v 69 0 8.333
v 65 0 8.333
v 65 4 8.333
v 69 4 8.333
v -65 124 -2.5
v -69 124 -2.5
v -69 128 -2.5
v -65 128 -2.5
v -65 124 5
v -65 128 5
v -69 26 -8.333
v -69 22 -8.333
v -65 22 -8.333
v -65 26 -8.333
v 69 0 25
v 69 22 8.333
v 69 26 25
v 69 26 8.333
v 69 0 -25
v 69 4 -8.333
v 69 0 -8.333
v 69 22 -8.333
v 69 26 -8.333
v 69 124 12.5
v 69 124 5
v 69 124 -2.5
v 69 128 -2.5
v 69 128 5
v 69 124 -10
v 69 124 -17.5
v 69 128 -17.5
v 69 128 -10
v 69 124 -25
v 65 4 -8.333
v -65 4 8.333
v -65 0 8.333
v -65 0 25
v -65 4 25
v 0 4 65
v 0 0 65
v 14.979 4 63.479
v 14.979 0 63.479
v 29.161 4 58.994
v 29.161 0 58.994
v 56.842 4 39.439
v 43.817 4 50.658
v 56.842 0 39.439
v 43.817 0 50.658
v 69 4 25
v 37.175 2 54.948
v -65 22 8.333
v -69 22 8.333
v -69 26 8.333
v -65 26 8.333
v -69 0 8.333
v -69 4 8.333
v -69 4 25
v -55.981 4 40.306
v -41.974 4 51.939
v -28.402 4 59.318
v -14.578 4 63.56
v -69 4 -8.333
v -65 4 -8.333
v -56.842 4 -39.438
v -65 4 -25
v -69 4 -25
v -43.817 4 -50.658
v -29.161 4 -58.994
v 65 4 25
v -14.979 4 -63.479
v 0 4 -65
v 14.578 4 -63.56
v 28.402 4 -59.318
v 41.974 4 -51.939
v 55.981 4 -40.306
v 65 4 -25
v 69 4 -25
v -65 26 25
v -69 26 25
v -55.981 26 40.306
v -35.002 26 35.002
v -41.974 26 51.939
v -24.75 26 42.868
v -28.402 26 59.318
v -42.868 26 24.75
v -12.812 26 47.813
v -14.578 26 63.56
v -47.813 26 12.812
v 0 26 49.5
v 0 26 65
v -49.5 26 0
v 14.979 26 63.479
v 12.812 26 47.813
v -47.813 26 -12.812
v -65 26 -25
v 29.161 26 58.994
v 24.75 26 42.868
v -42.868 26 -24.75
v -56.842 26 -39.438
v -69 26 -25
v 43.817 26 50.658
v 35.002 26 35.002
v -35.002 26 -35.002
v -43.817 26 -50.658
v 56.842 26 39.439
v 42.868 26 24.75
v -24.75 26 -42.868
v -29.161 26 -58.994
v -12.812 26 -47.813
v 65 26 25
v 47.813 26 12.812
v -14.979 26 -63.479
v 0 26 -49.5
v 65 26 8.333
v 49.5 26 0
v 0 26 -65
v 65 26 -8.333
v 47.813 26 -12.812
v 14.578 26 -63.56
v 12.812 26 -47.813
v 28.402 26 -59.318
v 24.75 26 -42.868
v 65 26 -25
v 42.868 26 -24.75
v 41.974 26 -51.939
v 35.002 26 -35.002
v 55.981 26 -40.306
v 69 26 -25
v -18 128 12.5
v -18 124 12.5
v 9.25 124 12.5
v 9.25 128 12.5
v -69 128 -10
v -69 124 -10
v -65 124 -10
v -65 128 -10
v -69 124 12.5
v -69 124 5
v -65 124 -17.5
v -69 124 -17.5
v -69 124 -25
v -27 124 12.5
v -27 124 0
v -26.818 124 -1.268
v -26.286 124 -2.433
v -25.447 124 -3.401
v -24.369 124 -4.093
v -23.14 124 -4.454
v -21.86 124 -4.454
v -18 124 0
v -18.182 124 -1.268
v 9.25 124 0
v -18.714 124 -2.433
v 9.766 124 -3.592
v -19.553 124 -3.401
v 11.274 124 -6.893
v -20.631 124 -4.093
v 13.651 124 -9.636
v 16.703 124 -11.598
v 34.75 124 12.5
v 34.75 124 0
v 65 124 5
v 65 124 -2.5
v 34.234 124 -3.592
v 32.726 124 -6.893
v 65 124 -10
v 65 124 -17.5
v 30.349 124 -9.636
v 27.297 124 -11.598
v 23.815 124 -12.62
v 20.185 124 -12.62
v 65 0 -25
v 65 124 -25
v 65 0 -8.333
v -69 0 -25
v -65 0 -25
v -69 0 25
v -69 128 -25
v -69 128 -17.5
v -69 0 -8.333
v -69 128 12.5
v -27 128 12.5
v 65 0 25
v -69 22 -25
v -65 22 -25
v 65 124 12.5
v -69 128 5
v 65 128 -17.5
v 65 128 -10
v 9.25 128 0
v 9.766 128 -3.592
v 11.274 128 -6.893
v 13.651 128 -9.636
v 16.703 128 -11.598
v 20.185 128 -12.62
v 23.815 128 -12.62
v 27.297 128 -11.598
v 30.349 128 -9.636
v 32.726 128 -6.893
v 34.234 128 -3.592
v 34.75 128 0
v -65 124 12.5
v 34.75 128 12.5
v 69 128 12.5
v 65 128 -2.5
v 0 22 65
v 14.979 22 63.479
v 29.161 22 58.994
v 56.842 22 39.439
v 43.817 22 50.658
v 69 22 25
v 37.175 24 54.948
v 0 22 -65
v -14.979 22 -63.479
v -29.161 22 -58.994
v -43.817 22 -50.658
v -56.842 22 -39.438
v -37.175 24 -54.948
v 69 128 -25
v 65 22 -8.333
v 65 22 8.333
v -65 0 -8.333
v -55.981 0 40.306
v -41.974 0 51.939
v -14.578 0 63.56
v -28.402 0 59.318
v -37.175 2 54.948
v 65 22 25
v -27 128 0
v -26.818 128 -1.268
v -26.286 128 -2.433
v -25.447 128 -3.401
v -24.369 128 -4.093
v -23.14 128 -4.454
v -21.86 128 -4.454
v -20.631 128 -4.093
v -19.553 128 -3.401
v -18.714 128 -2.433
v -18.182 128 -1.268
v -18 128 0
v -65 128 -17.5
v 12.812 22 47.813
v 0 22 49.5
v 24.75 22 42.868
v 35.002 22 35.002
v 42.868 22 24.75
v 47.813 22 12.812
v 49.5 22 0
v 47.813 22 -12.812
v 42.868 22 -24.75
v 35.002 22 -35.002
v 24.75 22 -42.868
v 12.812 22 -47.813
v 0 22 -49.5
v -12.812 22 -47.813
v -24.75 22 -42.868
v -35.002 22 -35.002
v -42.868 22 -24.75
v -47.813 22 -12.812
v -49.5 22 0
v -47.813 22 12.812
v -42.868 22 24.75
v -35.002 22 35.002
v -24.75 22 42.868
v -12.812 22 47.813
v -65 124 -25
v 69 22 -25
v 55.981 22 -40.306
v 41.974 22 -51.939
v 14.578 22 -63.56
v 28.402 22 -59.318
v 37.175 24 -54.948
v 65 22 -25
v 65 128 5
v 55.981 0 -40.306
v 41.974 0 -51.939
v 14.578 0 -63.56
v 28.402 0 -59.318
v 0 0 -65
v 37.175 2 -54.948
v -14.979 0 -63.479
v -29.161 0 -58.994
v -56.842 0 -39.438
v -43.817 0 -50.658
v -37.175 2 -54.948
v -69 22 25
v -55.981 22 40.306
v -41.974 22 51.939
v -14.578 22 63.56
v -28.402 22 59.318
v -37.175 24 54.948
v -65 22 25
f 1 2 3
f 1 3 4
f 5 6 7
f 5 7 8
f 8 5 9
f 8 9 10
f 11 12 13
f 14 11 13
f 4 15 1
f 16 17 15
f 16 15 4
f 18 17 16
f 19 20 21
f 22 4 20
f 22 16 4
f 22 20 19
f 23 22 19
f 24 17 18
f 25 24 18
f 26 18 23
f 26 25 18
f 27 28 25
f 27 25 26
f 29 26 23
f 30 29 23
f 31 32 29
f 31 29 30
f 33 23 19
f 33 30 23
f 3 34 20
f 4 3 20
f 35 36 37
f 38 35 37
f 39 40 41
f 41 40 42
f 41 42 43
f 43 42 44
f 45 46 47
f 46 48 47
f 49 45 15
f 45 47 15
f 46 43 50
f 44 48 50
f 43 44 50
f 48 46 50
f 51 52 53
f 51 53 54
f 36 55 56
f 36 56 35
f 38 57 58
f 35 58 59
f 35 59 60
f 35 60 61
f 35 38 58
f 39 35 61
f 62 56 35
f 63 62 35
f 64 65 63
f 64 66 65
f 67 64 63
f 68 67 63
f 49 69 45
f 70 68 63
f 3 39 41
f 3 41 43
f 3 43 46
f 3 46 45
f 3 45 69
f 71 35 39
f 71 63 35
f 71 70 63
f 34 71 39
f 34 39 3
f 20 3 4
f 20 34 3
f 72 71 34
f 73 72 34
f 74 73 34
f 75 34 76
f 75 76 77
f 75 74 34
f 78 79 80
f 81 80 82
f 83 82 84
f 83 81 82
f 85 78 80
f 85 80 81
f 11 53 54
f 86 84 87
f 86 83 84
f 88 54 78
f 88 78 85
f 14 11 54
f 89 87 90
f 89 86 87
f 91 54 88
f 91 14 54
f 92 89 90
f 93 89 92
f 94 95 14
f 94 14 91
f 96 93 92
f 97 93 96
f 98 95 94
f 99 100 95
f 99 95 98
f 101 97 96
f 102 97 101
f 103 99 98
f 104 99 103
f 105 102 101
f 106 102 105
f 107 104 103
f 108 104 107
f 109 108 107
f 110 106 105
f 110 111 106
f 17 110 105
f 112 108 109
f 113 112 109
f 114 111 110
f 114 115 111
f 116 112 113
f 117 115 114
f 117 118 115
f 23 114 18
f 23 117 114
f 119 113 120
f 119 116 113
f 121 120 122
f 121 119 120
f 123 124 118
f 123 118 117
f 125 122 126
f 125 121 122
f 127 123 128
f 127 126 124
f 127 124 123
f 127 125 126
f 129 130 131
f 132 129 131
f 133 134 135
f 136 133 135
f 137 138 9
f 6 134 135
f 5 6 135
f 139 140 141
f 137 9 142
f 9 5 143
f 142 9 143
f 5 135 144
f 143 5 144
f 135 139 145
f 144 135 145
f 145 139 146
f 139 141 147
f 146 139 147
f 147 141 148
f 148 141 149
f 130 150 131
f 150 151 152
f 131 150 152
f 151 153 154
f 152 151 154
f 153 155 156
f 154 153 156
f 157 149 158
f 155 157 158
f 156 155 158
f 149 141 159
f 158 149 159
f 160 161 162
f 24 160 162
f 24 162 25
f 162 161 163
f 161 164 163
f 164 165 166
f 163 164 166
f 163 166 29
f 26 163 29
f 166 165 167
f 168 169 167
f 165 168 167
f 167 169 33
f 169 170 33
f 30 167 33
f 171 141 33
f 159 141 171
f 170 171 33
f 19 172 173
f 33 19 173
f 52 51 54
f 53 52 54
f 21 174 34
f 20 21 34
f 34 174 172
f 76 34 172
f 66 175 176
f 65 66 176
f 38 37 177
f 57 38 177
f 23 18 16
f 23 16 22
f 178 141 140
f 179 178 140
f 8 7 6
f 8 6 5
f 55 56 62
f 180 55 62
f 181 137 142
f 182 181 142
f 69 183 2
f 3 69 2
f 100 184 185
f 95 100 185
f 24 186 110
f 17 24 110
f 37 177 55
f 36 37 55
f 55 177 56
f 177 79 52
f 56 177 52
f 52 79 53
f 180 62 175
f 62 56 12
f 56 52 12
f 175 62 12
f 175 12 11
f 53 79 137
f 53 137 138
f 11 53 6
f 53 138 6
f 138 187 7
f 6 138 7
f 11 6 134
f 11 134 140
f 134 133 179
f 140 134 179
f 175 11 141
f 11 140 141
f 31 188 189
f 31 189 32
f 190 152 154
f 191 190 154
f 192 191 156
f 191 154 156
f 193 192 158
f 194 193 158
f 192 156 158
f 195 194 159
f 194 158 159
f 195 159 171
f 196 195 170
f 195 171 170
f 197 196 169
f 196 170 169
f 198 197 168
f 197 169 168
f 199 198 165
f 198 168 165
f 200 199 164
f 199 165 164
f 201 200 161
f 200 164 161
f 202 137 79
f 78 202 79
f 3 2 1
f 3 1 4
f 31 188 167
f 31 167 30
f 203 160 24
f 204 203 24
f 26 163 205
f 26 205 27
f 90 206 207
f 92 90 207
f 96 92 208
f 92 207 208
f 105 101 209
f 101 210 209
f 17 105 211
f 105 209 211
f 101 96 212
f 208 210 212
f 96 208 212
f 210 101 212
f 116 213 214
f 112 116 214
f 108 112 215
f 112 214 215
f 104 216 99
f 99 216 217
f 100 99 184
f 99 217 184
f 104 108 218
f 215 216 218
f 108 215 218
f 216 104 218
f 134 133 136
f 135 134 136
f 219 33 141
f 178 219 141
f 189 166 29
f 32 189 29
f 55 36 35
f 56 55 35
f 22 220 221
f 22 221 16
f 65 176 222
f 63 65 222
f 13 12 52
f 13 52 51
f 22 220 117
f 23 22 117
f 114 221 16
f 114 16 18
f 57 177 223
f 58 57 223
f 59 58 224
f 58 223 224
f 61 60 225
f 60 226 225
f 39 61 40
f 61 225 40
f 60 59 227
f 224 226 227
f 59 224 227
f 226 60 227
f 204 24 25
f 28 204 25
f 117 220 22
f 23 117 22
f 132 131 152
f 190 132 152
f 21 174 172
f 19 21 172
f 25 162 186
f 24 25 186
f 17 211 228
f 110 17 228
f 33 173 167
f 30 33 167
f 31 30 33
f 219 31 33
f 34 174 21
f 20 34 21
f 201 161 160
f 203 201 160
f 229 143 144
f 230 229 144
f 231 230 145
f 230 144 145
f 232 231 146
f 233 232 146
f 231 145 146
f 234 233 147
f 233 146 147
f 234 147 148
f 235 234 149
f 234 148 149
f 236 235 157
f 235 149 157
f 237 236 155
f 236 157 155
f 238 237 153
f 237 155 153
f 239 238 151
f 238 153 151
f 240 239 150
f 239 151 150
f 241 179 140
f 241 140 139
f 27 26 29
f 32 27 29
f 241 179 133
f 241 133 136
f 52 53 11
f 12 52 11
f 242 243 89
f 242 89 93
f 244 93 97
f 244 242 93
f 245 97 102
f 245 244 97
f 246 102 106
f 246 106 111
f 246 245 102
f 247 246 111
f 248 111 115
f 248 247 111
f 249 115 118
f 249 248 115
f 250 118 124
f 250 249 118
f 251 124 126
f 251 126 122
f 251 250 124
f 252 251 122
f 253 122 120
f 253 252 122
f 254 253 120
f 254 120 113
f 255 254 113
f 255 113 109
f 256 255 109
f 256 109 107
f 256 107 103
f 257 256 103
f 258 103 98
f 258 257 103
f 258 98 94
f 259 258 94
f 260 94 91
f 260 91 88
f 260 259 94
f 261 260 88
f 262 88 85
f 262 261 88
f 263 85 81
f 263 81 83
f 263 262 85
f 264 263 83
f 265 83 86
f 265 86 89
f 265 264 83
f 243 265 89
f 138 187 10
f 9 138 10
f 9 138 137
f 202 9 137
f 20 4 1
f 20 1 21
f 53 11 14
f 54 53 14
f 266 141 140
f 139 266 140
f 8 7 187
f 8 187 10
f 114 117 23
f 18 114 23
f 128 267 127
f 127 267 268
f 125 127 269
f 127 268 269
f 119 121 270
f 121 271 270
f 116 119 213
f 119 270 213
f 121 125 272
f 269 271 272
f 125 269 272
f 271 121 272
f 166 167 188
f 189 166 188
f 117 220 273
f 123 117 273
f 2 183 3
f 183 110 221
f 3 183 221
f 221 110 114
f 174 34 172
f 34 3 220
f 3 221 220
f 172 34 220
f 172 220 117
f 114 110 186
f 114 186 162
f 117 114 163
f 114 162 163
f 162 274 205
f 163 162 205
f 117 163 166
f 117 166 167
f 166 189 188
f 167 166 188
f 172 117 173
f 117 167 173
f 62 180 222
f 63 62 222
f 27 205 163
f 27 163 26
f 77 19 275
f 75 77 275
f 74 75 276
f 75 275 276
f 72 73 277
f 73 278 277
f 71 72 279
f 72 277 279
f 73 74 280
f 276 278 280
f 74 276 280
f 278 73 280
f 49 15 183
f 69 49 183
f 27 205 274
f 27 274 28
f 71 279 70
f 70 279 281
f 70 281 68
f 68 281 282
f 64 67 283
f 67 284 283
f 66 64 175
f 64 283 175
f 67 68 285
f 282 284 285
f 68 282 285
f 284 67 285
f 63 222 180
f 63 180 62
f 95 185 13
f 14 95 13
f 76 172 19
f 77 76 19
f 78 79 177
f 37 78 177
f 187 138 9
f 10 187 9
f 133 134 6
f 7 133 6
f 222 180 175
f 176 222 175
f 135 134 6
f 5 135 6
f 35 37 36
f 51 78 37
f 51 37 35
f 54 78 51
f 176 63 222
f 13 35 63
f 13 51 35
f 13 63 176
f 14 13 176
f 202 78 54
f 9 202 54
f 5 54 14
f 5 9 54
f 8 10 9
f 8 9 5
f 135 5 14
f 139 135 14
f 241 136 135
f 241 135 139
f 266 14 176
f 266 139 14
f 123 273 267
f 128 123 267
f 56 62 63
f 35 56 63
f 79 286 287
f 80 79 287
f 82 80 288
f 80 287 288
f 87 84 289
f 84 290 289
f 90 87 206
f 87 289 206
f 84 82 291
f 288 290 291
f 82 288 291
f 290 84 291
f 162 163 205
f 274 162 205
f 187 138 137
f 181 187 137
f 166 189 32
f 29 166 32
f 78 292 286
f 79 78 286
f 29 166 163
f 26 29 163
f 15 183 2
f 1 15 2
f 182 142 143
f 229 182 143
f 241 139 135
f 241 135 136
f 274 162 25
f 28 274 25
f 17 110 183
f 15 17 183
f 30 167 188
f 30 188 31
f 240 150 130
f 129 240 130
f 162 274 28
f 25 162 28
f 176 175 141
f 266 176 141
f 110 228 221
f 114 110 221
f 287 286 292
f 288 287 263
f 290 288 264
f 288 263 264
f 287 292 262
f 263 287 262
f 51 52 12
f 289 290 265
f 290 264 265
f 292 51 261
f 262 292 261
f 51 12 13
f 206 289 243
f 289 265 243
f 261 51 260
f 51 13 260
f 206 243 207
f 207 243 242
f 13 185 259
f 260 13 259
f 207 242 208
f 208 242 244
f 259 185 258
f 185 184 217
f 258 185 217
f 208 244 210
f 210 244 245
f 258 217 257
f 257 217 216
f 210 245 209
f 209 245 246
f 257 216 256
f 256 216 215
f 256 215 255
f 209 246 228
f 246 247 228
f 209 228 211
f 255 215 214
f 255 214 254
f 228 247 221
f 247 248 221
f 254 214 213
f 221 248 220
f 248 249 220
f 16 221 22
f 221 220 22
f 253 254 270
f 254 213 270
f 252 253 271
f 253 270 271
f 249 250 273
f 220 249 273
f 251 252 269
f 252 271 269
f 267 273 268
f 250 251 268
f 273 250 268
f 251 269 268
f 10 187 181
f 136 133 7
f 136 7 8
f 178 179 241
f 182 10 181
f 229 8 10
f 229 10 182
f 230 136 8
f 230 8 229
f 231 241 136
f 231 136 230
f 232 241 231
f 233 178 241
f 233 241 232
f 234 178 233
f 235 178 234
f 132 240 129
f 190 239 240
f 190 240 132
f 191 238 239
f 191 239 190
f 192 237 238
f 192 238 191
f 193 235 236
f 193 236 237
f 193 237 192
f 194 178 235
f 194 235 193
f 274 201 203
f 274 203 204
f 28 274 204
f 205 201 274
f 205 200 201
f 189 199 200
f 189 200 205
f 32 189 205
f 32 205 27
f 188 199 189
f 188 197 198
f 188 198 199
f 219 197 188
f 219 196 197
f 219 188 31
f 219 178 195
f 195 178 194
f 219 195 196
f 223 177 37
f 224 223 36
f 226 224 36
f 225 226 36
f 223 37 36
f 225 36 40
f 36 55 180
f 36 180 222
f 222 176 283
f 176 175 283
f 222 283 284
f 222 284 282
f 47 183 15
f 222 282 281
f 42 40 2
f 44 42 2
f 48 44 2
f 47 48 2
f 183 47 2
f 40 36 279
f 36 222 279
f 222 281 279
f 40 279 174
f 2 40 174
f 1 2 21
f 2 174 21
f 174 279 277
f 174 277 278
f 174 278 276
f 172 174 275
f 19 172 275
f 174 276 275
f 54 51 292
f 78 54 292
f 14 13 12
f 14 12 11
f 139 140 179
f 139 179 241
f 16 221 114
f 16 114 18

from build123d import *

# Parameters (mm, degrees)
BOSS_EXTRUDE1_DEPTH = 4
SKETCH2_W           = 16.666666666
SKETCH2_H           = 4
BOSS_EXTRUDE2_DEPTH = 4
SKETCH4_R           = 49.5
BOSS_EXTRUDE3_DEPTH = 4
SKETCH5_W           = 16.666666666
SKETCH5_H           = 4
BOSS_EXTRUDE4_DEPTH = 4
BOSS_EXTRUDE5_DEPTH = 4
INDENT3_OUTLINE_W   = 4
INDENT3_OUTLINE_H   = 16.666666666
INDENT3_DEPTH       = 4
INDENT3_START       = 22
INDENT3_2_OUTLINE_W = 4
INDENT3_2_OUTLINE_H = 16.666666666
INDENT3_2_DEPTH     = 4
LPATTERN1_COUNT     = 2
LPATTERN1_PITCH     = 134
INDENT5_OUTLINE_W   = 4
INDENT5_OUTLINE_H   = 16.666666666
INDENT5_DEPTH       = 4
INDENT5_START       = 22
INDENT5_2_OUTLINE_W = 4
INDENT5_2_OUTLINE_H = 16.666666666
INDENT5_2_DEPTH     = 4
SKETCH8_W           = 4
SKETCH8_H           = 7.5
BOSS_EXTRUDE6_DEPTH = 4
LPATTERN3_COUNT     = 2
LPATTERN3_PITCH     = 134
BOSS_EXTRUDE7_DEPTH = 4
INDENT6_START       = -17.5
INDENT6_OUTLINE_W   = 4
INDENT6_OUTLINE_H   = 4
INDENT6_DEPTH       = 7.5
INDENT6_START_2     = -2.5
INDENT6_2_OUTLINE_W = 4
INDENT6_2_OUTLINE_H = 4
INDENT6_2_DEPTH     = 7.5


# Read off the part's stored shape, not the designer's step: Indent3, Indent5, Indent6
with BuildPart() as part:
    # Sketch1 → Boss-Extrude1 (new body)
    with BuildSketch(Plane(origin=(0, 0, 0), x_dir=(1, 0, 0), z_dir=(0, 1, 0))):
        with BuildLine():
            Line((-65, 25), (-65, -25))
            Line((-65, -25), (-69, -25))
            add(Edge.make_bspline(
                [(-69, -25), (-39.849959526, -64.895836828), (-2.6224e-05, -65)],
                knots=[0, 0, 0, 1, 1, 1], degree=2))
            add(Edge.make_bspline(
                [(-2.6224e-05, -65), (39.849922378, -64.895858771), (69, -25)],
                knots=[0, 0, 0, 1, 1, 1], degree=2))
            Line((69, -25), (65, -25))
            Line((65, -25), (65, 25))
            Line((65, 25), (69, 25))
            add(Edge.make_bspline(
                [(69, 25), (39.849915495, 64.895868161), (-4.5036e-05, 65)],
                knots=[0, 0, 0, 1, 1, 1], degree=2))
            add(Edge.make_bspline(
                [(-4.5036e-05, 65), (-39.849966409, 64.895827437), (-69, 25)],
                knots=[0, 0, 0, 1, 1, 1], degree=2))
            Line((-69, 25), (-65, 25))
        make_face()
    extrude(amount=BOSS_EXTRUDE1_DEPTH)

    # Sketch2 → Boss-Extrude2 (add)
    with BuildSketch(Plane(origin=(65, 0, 0), x_dir=(0, 0, -1), z_dir=(1, 0, 0))):
        with Locations((0, 2)):
            Rectangle(SKETCH2_W, SKETCH2_H)
    boss_extrude2 = extrude(amount=BOSS_EXTRUDE2_DEPTH)

    # Mirror1: Boss-Extrude2 across plane
    add(boss_extrude2.mirror(Plane(origin=(0, 0, 0), x_dir=(0, 0, 1), z_dir=(1, 0, 0))))


with BuildPart() as body_2:
    # Sketch4 → Boss-Extrude3 (new body)
    with BuildSketch(Plane(origin=(0, 22, 0), x_dir=(1, 0, 0), z_dir=(0, 1, 0))):
        with BuildLine():
            add(Edge.make_bspline(
                [(-69, -25), (-39.849959526, -64.895836827), (-2.6225e-05, -65)],
                knots=[0, 0, 0, 1, 1, 1], degree=2))
            add(Edge.make_bspline(
                [(-2.6225e-05, -65), (39.849922378, -64.895858771), (69, -25)],
                knots=[0, 0, 0, 1, 1, 1], degree=2))
            Line((69, -25), (65, -25))
            Line((65, -25), (65, 25))
            Line((65, 25), (69, 25))
            add(Edge.make_bspline(
                [(69, 25), (39.849915496, 64.895868161), (-4.5035e-05, 65)],
                knots=[0, 0, 0, 1, 1, 1], degree=2))
            add(Edge.make_bspline(
                [(-4.5035e-05, 65), (-39.849966364, 64.895827438), (-68.999999935, 25.000000088)],
                knots=[0, 0, 0, 1, 1, 1], degree=2))
            Line((-68.999999935, 25.000000088), (-65, 25))
            Line((-65, 25), (-65, -25))
            Line((-65, -25), (-69, -25))
        make_face()
        with Locations(Location((0, 0, 0), (0, 0, 270))):
            Circle(SKETCH4_R, mode=Mode.SUBTRACT)
    extrude(amount=BOSS_EXTRUDE3_DEPTH)

    # Sketch5 → Boss-Extrude4 (add)
    with BuildSketch(Plane(origin=(65, 0, 0), x_dir=(0, 0, -1), z_dir=(1, 0, 0))):
        with Locations((0, 24)):
            Rectangle(SKETCH5_W, SKETCH5_H)
    boss_extrude4 = extrude(amount=BOSS_EXTRUDE4_DEPTH)

    # Mirror2: Boss-Extrude4 across plane
    add(boss_extrude4.mirror(Plane(origin=(0, 0, 0), x_dir=(0, 0, 1), z_dir=(1, 0, 0))))


with BuildPart() as body_3:
    # Sketch6 → Boss-Extrude5 (new body)
    with BuildSketch(Plane(origin=(65, 0, 0), x_dir=(0, 0, -1), z_dir=(1, 0, 0))):
        Polygon((25, 26), (25, 124), (-12.5, 124), (-25, 26), (-25, 0), (25, 0), align=None)
    boss_extrude5 = extrude(amount=BOSS_EXTRUDE5_DEPTH)

    # Indent3 outline → Indent3 (cut)
    with BuildSketch(Plane(origin=(0, 0, 0), x_dir=(1, 0, 0), z_dir=(0, 1, 0))):
        with Locations((67, 0)):
            Rectangle(INDENT3_OUTLINE_W, INDENT3_OUTLINE_H)
    extrude(amount=INDENT3_DEPTH, mode=Mode.SUBTRACT)

    # Indent3 2 outline → Indent3 2 (cut)
    with BuildSketch(Plane(origin=(0, 0, 0), x_dir=(1, 0, 0), z_dir=(0, 1, 0)).offset(INDENT3_START)):
        with Locations((67, 0)):
            Rectangle(INDENT3_2_OUTLINE_W, INDENT3_2_OUTLINE_H)
    extrude(amount=INDENT3_2_DEPTH, mode=Mode.SUBTRACT)

    # Sketch8 → Boss-Extrude6 (add)
    with BuildSketch(Plane(origin=(0, 124, 0), x_dir=(1, 0, 0), z_dir=(0, 1, 0))):
        with Locations((67, 13.75)):
            Rectangle(SKETCH8_W, SKETCH8_H)
        with Locations((67, -1.25)):
            Rectangle(SKETCH8_W, SKETCH8_H)
    boss_extrude6 = extrude(amount=BOSS_EXTRUDE6_DEPTH)


with BuildPart() as lpattern1_1:
    # LPattern1: Boss-Extrude5 ×2
    with Locations(*[(-i * LPATTERN1_PITCH, 0, 0) for i in range(1, LPATTERN1_COUNT)]):
        add(boss_extrude5)

    # Indent5 outline → Indent5 (cut)
    with BuildSketch(Plane(origin=(0, 0, 0), x_dir=(1, 0, 0), z_dir=(0, 1, 0))):
        with Locations((-67, 0)):
            Rectangle(INDENT5_OUTLINE_W, INDENT5_OUTLINE_H)
    extrude(amount=INDENT5_DEPTH, mode=Mode.SUBTRACT)

    # Indent5 2 outline → Indent5 2 (cut)
    with BuildSketch(Plane(origin=(0, 0, 0), x_dir=(1, 0, 0), z_dir=(0, 1, 0)).offset(INDENT5_START)):
        with Locations((-67, 0)):
            Rectangle(INDENT5_2_OUTLINE_W, INDENT5_2_OUTLINE_H)
    extrude(amount=INDENT5_2_DEPTH, mode=Mode.SUBTRACT)

    # LPattern3: Boss-Extrude6 ×2
    with Locations(*[(-i * LPATTERN3_PITCH, 0, 0) for i in range(1, LPATTERN3_COUNT)]):
        add(boss_extrude6)


with BuildPart() as body_5:
    # Sketch9 → Boss-Extrude7 (new body)
    with BuildSketch(Plane(origin=(0, 124, 0), x_dir=(1, 0, 0), z_dir=(0, 1, 0))):
        with BuildLine():
            Line((-69, -12.5), (-27, -12.5))
            Line((-27, -12.5), (-27, 0))
            ThreePointArc((-27, 0), (-22.5, 4.5), (-18, 0))
            Line((-18, 0), (-18, -12.5))
            Line((-18, -12.5), (9.25, -12.5))
            Line((9.25, -12.5), (9.25, 0))
            ThreePointArc((9.25, 0), (22, 12.75), (34.75, 0))
            Line((34.75, 0), (34.75, -12.5))
            Line((34.75, -12.5), (69, -12.5))
            Line((69, -12.5), (69, 25))
            Line((69, 25), (-69, 25))
            Line((-69, 25), (-69, -12.5))
        make_face()
    extrude(amount=BOSS_EXTRUDE7_DEPTH)

    # Indent6 outline → Indent6 (cut)
    with BuildSketch(Plane.XY.offset(INDENT6_START)):
        with Locations((67, 126)):
            Rectangle(INDENT6_OUTLINE_W, INDENT6_OUTLINE_H)
        with Locations((-67, 126)):
            Rectangle(INDENT6_OUTLINE_W, INDENT6_OUTLINE_H)
    extrude(amount=INDENT6_DEPTH, mode=Mode.SUBTRACT)

    # Indent6 2 outline → Indent6 2 (cut)
    with BuildSketch(Plane.XY.offset(INDENT6_START_2)):
        with Locations((67, 126)):
            Rectangle(INDENT6_2_OUTLINE_W, INDENT6_2_OUTLINE_H)
        with Locations((-67, 126)):
            Rectangle(INDENT6_2_OUTLINE_W, INDENT6_2_OUTLINE_H)
    extrude(amount=INDENT6_2_DEPTH, mode=Mode.SUBTRACT)


solid = Compound([part.part, body_2.part, body_3.part, lpattern1_1.part, body_5.part])
